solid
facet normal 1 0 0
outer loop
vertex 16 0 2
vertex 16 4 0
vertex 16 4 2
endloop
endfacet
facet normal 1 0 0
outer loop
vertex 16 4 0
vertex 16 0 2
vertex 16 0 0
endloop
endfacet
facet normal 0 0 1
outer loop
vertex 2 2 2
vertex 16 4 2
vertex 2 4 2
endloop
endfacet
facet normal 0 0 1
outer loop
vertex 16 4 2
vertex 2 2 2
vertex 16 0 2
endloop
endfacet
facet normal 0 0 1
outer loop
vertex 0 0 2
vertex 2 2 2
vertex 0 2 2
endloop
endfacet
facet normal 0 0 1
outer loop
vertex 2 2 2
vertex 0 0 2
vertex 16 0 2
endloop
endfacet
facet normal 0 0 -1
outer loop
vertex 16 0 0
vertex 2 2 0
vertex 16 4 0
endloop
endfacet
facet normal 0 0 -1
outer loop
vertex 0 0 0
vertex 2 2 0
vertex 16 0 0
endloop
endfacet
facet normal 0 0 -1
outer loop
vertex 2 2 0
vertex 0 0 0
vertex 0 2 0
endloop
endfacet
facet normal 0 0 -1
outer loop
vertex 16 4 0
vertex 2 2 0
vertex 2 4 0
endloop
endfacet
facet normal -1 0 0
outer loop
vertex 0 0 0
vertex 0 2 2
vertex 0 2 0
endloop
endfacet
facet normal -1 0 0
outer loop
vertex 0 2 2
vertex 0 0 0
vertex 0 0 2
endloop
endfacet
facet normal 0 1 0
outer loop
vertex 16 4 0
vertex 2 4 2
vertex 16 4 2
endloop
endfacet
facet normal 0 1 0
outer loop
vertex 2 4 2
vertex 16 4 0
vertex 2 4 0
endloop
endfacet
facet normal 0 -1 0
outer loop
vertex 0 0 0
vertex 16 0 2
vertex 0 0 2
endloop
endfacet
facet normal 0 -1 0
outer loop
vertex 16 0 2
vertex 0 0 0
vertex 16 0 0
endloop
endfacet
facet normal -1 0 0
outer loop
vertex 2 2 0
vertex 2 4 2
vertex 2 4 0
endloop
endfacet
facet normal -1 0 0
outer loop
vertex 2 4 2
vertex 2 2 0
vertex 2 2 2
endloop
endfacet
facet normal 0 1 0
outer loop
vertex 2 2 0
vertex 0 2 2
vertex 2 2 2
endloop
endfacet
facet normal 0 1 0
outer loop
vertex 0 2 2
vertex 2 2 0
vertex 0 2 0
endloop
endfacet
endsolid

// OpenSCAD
use <MCAD/boxes.scad>

BIG = [1024, 1024, 1024];

module mark(name, height, size = 2) {
	linear_extrude(height, center = false)	text(name, size = size);
}
module hole(w, h) {
	translate([w / 2, h / 2, 0])		roundedBox(size=[w, h, 1024], radius = w / 4, sidesonly = true);
}
module ellipsis(w, h) {
	translate([w / 2, h / 2, 0])
		resize([w, h, 1024])
			cylinder(1024, 1024, 1024);
}
module cornerHole(base, m, in, out, height) {
	delta = (out - in) / 2;
		translate([m,					m,					0])	ellipsis(in, in);
		translate([base[0] - m,	m,					0])	ellipsis(in, in);
		translate([base[0] - m,	base[1] - m,		0])	ellipsis(in, in);
		translate([m,					base[1] - m,		0])	ellipsis(in, in);

		translate([m - delta,					m - delta,					height])	ellipsis(out, out);
		translate([base[0] - m  - delta,	m - delta,					height])	ellipsis(out, out);
		translate([base[0] - m  - delta,	base[1] - m - delta,	height])	ellipsis(out, out);
		translate([m - delta,					base[1] - m - delta,	height])	ellipsis(out, out);
}
module lineBox(outter = [100, 100, 100], t = 2) {
	size = outter - [t*2, t*2, t*2];
	center = false;

	translate([t, t, t])	{
		
	// x
	translate([0, 0, 0])						rotate([0, 90, 0])		cylinder(h = size[0], r = t, center = center);
	translate([0, size[1], 0])			rotate([0, 90, 0])		cylinder(h = size[0], r = t, center = center);
	translate([0, size[1], size[2]])	rotate([0, 90, 0])		cylinder(h = size[0], r = t, center = center);
	translate([0, 0, size[2]])			rotate([0, 90, 0])		cylinder(h = size[0], r = t, center = center);

	// y
	translate([0, 0, 0])						rotate([270, 0, 0])		cylinder(h = size[1], r = t, center = center);
	translate([size[0], 0, 0])			rotate([270, 0, 0])		cylinder(h = size[1], r = t, center = center);
	translate([size[0], 0, size[2]])	rotate([270, 0, 0])		cylinder(h = size[1], r = t, center = center);
	translate([0, 0, size[2]])			rotate([270, 0, 0])		cylinder(h = size[1], r = t, center = center);

	// z
	translate([0, 0, 0])						rotate([0, 0, 0])		cylinder(h = size[2], r = t, center = center);
	translate([size[0], 0, 0])			rotate([0, 0, 0])		cylinder(h = size[2], r = t, center = center);
	translate([size[0], size[1], 0])	rotate([0, 0, 0])		cylinder(h = size[2], r = t, center = center);
	translate([0, size[1], 0])	rotate([0, 0, 0])				cylinder(h = size[2], r = t, center = center);
	}
}
module hide(show = 0) {
	if (show > 0) children();
	else scale([0, 0, 0])	children();
}

module t() {
	c = [0.5, 0.5, 0.5, 0.5];
	d = [0.5, 0.5, 0.0, 0.5];
	
	color(c)	difference() {
		cube([4, 16, 2]);
		translate([2, -2, -1])	cube([4, 4, 4]);
	}
	color(d)	translate([8, 0, 0])	cube([16, 4, 2]);
}

module test(b) {
	
	c = [0.5, 0.5, 0.5, 0.5];
	d = [0.5, 0.5, 0.0, 0.5];
	
	color(c)	difference() {
		cube(b);
		translate([-BIG[0]+b[1]/2, b[1]/2, -BIG[2] / 2])	cube(BIG);
		//translate([b[0]-b[1]/2, b[1]/2, -1])	cube([b[1], b[1], b[2]*2]);
	}
}
		//translate([-BIG[0]+16, 16, 0])	cube(BIG);
test([16, 4, 2]);
//cube(BIG);
